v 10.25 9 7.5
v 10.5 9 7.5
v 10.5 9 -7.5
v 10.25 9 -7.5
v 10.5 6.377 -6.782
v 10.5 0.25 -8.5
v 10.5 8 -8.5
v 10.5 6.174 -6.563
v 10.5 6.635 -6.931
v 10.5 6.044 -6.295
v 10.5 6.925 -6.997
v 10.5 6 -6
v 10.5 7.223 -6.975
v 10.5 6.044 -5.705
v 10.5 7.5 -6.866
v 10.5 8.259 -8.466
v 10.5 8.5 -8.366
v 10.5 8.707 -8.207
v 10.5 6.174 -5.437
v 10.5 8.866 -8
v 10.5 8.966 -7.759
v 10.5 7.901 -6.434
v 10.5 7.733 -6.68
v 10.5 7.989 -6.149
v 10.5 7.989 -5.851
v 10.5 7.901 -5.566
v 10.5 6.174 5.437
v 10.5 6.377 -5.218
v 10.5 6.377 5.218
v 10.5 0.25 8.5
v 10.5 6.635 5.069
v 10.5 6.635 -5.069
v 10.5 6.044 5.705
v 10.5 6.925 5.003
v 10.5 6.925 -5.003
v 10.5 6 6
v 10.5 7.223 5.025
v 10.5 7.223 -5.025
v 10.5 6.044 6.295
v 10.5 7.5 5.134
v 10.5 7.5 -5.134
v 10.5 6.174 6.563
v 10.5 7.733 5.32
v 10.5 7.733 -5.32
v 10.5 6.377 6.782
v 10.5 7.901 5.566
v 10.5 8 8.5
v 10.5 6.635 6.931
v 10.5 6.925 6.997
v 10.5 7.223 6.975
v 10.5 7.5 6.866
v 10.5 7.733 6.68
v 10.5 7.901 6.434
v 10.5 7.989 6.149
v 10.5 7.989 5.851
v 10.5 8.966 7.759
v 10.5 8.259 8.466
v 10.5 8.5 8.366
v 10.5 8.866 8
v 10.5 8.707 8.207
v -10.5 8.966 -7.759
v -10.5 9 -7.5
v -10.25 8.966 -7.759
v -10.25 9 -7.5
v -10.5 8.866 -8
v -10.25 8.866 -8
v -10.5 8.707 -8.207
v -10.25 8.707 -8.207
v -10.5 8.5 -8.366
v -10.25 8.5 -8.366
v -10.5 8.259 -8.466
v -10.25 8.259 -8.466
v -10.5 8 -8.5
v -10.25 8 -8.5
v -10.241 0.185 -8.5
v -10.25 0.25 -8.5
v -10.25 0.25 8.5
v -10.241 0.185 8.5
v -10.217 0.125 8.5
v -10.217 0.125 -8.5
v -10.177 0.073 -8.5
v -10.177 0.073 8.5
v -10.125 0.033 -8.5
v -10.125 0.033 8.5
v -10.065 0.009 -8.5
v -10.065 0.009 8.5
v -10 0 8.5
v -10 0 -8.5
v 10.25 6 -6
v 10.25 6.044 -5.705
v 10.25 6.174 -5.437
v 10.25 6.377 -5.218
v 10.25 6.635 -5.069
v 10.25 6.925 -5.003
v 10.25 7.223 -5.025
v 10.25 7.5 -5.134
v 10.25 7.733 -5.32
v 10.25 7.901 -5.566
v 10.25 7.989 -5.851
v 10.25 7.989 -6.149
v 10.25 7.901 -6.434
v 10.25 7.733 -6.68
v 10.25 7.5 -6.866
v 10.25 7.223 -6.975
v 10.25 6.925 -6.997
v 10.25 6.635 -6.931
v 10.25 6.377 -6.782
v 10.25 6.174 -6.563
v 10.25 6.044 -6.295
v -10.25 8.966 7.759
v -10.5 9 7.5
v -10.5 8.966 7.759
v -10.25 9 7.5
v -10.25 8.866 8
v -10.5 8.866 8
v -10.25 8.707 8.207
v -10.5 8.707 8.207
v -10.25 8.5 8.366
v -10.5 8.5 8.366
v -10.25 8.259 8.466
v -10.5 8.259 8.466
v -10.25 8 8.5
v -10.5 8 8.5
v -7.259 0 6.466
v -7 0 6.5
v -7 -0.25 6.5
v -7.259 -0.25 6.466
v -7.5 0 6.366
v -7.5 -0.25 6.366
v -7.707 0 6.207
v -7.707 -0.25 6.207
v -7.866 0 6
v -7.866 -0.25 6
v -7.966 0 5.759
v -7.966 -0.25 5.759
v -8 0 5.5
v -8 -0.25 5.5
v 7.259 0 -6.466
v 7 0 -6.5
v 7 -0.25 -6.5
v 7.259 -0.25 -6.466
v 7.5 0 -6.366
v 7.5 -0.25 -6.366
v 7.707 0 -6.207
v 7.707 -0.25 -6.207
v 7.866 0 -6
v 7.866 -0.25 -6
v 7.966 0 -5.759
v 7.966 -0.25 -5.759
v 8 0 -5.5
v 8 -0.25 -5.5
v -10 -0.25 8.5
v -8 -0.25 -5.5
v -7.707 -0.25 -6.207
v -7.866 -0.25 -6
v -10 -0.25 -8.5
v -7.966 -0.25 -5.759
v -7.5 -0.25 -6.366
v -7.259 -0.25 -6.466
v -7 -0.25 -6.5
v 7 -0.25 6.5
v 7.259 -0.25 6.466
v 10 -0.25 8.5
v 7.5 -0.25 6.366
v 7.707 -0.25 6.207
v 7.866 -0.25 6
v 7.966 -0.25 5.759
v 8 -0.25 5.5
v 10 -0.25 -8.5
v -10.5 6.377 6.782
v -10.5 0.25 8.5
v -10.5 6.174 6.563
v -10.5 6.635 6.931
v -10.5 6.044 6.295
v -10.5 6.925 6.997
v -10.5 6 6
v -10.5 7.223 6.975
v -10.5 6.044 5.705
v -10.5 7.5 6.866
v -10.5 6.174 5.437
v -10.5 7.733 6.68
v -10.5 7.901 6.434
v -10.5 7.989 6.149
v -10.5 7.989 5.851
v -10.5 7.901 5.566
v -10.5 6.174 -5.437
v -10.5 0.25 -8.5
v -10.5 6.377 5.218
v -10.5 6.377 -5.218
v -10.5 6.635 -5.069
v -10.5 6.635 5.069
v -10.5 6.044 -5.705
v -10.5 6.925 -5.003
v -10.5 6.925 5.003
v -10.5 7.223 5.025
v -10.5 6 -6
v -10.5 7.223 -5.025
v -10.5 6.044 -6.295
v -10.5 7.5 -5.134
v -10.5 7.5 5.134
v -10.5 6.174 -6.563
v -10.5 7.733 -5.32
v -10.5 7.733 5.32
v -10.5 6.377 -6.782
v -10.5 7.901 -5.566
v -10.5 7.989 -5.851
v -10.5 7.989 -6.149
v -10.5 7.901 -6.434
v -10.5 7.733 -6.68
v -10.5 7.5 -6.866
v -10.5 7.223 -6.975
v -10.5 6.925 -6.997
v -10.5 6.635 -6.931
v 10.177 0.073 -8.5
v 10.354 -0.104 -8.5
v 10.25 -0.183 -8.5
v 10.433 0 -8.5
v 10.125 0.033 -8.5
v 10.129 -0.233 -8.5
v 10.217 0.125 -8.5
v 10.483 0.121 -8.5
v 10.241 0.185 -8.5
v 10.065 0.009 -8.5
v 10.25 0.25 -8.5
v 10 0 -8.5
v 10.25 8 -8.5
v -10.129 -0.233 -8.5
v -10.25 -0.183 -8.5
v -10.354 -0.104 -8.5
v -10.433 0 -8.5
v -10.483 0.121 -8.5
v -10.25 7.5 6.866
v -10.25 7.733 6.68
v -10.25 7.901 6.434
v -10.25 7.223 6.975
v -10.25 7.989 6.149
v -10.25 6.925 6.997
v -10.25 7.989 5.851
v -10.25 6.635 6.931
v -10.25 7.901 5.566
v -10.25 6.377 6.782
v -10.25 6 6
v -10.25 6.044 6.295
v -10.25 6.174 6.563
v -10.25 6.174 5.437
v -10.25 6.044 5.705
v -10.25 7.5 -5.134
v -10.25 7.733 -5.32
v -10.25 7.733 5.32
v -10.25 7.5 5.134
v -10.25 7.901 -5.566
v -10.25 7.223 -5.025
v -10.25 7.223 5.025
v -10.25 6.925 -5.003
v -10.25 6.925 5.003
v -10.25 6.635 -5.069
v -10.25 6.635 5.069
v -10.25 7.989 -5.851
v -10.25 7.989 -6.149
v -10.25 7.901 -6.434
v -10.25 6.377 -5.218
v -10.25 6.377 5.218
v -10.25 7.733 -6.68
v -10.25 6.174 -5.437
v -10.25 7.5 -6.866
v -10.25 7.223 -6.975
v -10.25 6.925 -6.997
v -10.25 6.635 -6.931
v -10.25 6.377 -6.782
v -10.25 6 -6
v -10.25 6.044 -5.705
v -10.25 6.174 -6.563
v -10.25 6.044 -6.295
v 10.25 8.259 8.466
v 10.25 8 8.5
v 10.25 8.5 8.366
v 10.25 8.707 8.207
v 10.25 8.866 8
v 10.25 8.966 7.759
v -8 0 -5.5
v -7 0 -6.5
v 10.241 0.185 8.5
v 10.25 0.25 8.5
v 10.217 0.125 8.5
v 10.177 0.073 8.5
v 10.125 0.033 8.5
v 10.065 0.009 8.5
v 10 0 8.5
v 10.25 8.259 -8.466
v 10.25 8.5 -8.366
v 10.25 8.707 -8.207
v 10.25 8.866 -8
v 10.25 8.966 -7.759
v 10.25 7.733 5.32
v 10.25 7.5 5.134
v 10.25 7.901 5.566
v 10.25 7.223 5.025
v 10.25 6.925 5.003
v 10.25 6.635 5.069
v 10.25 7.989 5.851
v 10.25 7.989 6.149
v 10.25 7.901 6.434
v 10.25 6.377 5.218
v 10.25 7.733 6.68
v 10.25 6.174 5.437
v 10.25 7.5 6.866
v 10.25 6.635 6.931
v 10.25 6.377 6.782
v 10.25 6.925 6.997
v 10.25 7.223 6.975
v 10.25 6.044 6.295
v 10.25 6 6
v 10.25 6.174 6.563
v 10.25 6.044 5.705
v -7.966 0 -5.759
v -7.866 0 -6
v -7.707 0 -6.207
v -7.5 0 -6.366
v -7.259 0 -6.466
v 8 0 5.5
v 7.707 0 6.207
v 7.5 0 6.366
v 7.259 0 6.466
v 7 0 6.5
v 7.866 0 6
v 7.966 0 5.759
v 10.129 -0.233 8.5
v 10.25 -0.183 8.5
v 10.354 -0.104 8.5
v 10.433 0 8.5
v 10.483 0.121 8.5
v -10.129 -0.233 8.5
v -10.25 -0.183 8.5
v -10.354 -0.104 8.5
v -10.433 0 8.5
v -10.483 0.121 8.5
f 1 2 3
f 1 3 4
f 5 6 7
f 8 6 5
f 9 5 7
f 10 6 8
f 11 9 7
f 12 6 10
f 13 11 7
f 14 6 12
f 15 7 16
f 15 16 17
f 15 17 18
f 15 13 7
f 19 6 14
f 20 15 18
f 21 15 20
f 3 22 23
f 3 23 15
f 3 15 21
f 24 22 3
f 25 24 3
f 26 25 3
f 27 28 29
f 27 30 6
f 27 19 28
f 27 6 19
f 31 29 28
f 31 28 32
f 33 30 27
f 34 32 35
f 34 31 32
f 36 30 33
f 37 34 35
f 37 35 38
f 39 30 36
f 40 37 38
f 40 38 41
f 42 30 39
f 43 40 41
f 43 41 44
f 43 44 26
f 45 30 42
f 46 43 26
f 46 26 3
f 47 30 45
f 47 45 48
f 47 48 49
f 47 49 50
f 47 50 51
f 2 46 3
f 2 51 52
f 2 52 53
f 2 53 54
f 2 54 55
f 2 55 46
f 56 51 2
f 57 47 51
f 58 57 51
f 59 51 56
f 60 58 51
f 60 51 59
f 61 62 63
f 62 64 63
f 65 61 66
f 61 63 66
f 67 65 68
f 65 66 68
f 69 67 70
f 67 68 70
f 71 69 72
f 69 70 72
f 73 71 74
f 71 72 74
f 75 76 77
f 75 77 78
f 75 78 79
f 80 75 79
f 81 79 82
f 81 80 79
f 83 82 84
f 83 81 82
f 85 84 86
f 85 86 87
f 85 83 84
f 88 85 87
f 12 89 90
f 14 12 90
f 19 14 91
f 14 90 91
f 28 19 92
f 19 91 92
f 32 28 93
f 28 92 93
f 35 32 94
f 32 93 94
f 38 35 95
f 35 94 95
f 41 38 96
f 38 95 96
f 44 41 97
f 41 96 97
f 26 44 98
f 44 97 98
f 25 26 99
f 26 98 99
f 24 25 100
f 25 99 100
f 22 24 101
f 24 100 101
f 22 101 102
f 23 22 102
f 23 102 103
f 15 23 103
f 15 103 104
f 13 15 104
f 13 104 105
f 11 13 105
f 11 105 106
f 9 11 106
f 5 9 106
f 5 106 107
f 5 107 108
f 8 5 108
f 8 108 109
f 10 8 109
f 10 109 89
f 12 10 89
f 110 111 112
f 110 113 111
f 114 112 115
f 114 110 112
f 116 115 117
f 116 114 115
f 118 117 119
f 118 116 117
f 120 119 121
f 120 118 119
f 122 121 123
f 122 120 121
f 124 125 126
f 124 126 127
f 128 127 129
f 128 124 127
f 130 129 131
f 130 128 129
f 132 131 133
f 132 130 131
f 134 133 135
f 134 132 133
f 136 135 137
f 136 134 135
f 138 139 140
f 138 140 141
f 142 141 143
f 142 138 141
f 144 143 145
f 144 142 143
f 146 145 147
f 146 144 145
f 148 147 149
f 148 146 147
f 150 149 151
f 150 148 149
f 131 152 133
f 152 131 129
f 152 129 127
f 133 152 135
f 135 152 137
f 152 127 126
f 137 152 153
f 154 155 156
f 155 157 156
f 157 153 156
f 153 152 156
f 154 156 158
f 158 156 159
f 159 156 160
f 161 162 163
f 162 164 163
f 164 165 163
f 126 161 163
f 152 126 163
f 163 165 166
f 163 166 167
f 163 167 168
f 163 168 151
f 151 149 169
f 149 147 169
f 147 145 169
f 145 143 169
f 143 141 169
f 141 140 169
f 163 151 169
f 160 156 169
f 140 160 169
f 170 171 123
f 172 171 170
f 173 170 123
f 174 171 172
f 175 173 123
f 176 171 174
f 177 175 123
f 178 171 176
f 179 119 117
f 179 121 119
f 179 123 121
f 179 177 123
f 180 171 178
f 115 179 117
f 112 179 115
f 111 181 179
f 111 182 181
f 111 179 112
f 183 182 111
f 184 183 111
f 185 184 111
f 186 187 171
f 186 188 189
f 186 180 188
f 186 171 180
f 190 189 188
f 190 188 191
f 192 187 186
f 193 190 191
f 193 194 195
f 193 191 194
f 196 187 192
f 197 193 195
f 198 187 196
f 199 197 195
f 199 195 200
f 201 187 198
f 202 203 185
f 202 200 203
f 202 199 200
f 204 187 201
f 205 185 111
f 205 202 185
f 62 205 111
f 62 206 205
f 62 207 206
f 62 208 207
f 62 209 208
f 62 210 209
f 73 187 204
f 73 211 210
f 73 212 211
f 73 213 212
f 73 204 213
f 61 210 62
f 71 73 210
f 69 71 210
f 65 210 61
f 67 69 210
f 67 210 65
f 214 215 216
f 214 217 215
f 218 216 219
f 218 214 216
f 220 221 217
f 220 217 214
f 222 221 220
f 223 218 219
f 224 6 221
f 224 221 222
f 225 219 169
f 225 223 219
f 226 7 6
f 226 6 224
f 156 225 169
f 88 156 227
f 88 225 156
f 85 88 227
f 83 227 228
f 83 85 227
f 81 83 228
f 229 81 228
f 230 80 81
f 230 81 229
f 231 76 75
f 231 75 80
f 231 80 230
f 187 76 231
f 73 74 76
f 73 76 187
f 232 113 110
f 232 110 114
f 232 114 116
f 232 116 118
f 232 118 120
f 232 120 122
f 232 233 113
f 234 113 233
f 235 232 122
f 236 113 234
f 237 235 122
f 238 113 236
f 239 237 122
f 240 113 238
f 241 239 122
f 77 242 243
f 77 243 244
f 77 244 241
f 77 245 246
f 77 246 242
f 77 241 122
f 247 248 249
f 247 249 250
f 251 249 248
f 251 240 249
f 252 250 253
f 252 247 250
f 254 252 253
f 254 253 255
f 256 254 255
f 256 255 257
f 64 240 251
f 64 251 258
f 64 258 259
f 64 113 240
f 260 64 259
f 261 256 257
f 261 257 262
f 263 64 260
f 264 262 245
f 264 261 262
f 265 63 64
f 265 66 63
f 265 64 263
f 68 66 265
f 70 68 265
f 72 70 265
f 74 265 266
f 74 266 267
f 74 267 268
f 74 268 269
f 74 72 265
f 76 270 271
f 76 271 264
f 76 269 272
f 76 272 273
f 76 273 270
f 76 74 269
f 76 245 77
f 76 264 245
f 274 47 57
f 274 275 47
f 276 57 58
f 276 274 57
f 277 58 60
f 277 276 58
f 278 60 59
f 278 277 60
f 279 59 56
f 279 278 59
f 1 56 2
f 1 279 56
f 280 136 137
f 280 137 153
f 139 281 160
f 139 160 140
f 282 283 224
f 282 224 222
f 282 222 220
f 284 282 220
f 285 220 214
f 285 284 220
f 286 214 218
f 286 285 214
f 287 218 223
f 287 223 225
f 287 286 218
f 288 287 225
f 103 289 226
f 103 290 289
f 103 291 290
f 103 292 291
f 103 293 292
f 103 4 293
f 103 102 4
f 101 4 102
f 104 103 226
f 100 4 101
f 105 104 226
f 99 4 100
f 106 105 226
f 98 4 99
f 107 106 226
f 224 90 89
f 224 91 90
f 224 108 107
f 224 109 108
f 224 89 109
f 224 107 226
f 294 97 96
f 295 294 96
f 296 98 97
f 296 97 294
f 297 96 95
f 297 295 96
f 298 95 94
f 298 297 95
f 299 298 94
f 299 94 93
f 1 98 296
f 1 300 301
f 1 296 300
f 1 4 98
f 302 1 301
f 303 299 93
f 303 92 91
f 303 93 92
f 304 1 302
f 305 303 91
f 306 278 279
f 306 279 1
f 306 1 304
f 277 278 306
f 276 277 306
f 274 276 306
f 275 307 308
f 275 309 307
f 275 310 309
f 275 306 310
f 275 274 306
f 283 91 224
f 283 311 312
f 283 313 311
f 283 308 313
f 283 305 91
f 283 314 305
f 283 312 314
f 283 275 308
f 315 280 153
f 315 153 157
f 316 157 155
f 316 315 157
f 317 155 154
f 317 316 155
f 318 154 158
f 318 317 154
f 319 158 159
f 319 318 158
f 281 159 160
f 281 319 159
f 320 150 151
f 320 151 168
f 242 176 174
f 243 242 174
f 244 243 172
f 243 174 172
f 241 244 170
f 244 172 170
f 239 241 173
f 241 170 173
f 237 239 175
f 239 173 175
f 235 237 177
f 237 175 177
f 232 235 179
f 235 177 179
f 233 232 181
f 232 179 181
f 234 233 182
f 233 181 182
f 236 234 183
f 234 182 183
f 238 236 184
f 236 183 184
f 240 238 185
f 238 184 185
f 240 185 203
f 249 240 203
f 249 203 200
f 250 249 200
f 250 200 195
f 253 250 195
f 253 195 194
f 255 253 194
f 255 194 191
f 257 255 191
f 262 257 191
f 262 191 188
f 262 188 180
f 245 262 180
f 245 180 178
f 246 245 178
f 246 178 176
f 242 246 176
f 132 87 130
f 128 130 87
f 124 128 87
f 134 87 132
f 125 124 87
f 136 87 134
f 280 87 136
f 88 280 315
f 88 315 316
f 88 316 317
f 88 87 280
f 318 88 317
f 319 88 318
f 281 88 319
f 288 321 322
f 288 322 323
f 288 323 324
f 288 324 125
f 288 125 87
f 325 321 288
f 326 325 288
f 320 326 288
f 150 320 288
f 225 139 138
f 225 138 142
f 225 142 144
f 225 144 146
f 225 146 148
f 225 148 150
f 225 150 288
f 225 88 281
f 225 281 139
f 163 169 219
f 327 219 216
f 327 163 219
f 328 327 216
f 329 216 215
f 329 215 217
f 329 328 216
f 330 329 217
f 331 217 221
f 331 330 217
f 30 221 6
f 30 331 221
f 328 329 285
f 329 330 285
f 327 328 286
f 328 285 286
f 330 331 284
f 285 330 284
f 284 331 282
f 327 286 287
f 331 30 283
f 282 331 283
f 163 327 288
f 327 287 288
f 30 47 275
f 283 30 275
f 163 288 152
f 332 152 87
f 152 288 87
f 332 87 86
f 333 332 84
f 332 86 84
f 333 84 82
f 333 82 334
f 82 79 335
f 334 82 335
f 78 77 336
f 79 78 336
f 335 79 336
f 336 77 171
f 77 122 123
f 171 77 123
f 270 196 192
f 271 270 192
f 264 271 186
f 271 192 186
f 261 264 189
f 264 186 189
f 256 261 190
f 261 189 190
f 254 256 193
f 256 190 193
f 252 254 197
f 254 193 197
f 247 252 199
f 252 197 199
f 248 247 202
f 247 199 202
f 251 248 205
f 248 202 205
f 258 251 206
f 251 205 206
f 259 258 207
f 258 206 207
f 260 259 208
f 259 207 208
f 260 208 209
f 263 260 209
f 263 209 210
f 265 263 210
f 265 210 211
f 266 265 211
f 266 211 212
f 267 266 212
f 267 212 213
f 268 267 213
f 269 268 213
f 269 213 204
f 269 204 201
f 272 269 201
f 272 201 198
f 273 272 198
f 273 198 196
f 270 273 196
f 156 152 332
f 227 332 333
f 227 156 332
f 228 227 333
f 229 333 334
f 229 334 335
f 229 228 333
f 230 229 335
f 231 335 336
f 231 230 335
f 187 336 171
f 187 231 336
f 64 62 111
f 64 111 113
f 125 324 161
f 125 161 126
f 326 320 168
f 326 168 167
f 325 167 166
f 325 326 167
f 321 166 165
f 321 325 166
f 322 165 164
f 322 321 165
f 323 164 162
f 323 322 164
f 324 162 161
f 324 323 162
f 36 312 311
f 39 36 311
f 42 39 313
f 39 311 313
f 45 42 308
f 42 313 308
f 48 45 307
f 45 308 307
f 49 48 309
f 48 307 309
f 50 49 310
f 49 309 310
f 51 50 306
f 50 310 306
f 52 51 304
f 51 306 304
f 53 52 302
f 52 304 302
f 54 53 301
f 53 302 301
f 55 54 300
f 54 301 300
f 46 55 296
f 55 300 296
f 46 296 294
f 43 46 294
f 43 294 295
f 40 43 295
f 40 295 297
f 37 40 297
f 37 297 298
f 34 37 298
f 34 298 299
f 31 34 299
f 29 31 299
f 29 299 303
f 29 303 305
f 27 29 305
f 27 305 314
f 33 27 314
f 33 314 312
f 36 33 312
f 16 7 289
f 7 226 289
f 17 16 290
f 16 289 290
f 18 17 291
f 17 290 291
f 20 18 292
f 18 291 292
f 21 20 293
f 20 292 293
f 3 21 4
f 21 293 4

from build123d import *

# Parameters (mm, degrees)
SKETCH1_W          = 20
SKETCH1_H          = 17
BASE_FLANGE1_DEPTH = 0.25
CUT_EXTRUDE1_DEPTH = 14.126785593
EDGE_FLANGE2_DEPTH = 17
EDGE_FLANGE3_DEPTH = 17
FILLET1_R          = 1
SKETCH27_R         = 1
CUT_EXTRUDE2_DEPTH = 25.377243486


# Sheet-metal steps are written as plain solids
with BuildPart() as part:
    # Sketch1 → Base-Flange1 (new body)
    with BuildSketch(Plane(origin=(0, 0, 0), x_dir=(1, 0, 0), z_dir=(0, 1, 0))):
        Rectangle(SKETCH1_W, SKETCH1_H)
    extrude(amount=-BASE_FLANGE1_DEPTH)

    # Sketch6 → Cut-Extrude1 (cut, through all)
    with BuildSketch(Plane(origin=(0, 0, 0), x_dir=(1, 0, 0), z_dir=(0, 1, 0))):
        with BuildLine():
            Line((-7, 6.5), (7, 6.5))
            ThreePointArc((7, 6.5), (7.707106781, 6.207106781), (8, 5.5))
            Line((8, 5.5), (8, -5.5))
            ThreePointArc((8, -5.5), (7.707106781, -6.207106781), (7, -6.5))
            Line((7, -6.5), (-7, -6.5))
            ThreePointArc((-7, -6.5), (-7.707106781, -6.207106781), (-8, -5.5))
            Line((-8, -5.5), (-8, 5.5))
            ThreePointArc((-8, 5.5), (-7.707106781, 6.207106781), (-7, 6.5))
        make_face()
    extrude(amount=-CUT_EXTRUDE1_DEPTH, mode=Mode.SUBTRACT)

    # Edge-Flange2 section (across the edge) → Edge-Flange2 (add)
    with BuildSketch(Plane(origin=(10.25, 0, 8.5), x_dir=(-1, 0, 0), z_dir=(0, 0, -1))):
        with BuildLine():
            Line((-0.25, 0.25), (-0.25, 9))
            Line((-0.25, 9), (0, 9))
            Line((0, 9), (0, 0.25))
            ThreePointArc((0, 0.25), (0.073223305, 0.073223305), (0.25, 0))
            Line((0.25, 0), (0.25, -0.25))
            ThreePointArc((0.25, -0.25), (-0.103553391, -0.103553391), (-0.25, 0.25))
        make_face()
    extrude(amount=EDGE_FLANGE2_DEPTH)

    # Edge-Flange3 section (across the edge) → Edge-Flange3 (add)
    with BuildSketch(Plane(origin=(-10.25, 0, -8.5), x_dir=(1, 0, 0), z_dir=(0, 0, 1))):
        with BuildLine():
            Line((-0.25, 0.25), (-0.25, 9))
            Line((-0.25, 9), (0, 9))
            Line((0, 9), (0, 0.25))
            ThreePointArc((0, 0.25), (0.073223305, 0.073223305), (0.25, 0))
            Line((0.25, 0), (0.25, -0.25))
            ThreePointArc((0.25, -0.25), (-0.103553391, -0.103553391), (-0.25, 0.25))
        make_face()
    extrude(amount=EDGE_FLANGE3_DEPTH)

    # Fillet1
    fillet1_edges = [part.edges().sort_by_distance(p)[0] for p in [
        (10.375, 9, 8.5),
        (10.375, 9, -8.5),
        (-10.375, 9, -8.5),
        (-10.375, 9, 8.5),
    ]]
    fillet(fillet1_edges, radius=FILLET1_R)

    # Sketch27 → Cut-Extrude2 (cut, through all)
    with BuildSketch(Plane.ZY.offset(10.5)):
        with Locations(Location((-6, 7, 0), (0, 0, 270))):
            Circle(SKETCH27_R)
        with Locations(Location((6, 7, 0), (0, 0, 270))):
            Circle(SKETCH27_R)
    extrude(amount=-CUT_EXTRUDE2_DEPTH, mode=Mode.SUBTRACT)


solid = part.part
